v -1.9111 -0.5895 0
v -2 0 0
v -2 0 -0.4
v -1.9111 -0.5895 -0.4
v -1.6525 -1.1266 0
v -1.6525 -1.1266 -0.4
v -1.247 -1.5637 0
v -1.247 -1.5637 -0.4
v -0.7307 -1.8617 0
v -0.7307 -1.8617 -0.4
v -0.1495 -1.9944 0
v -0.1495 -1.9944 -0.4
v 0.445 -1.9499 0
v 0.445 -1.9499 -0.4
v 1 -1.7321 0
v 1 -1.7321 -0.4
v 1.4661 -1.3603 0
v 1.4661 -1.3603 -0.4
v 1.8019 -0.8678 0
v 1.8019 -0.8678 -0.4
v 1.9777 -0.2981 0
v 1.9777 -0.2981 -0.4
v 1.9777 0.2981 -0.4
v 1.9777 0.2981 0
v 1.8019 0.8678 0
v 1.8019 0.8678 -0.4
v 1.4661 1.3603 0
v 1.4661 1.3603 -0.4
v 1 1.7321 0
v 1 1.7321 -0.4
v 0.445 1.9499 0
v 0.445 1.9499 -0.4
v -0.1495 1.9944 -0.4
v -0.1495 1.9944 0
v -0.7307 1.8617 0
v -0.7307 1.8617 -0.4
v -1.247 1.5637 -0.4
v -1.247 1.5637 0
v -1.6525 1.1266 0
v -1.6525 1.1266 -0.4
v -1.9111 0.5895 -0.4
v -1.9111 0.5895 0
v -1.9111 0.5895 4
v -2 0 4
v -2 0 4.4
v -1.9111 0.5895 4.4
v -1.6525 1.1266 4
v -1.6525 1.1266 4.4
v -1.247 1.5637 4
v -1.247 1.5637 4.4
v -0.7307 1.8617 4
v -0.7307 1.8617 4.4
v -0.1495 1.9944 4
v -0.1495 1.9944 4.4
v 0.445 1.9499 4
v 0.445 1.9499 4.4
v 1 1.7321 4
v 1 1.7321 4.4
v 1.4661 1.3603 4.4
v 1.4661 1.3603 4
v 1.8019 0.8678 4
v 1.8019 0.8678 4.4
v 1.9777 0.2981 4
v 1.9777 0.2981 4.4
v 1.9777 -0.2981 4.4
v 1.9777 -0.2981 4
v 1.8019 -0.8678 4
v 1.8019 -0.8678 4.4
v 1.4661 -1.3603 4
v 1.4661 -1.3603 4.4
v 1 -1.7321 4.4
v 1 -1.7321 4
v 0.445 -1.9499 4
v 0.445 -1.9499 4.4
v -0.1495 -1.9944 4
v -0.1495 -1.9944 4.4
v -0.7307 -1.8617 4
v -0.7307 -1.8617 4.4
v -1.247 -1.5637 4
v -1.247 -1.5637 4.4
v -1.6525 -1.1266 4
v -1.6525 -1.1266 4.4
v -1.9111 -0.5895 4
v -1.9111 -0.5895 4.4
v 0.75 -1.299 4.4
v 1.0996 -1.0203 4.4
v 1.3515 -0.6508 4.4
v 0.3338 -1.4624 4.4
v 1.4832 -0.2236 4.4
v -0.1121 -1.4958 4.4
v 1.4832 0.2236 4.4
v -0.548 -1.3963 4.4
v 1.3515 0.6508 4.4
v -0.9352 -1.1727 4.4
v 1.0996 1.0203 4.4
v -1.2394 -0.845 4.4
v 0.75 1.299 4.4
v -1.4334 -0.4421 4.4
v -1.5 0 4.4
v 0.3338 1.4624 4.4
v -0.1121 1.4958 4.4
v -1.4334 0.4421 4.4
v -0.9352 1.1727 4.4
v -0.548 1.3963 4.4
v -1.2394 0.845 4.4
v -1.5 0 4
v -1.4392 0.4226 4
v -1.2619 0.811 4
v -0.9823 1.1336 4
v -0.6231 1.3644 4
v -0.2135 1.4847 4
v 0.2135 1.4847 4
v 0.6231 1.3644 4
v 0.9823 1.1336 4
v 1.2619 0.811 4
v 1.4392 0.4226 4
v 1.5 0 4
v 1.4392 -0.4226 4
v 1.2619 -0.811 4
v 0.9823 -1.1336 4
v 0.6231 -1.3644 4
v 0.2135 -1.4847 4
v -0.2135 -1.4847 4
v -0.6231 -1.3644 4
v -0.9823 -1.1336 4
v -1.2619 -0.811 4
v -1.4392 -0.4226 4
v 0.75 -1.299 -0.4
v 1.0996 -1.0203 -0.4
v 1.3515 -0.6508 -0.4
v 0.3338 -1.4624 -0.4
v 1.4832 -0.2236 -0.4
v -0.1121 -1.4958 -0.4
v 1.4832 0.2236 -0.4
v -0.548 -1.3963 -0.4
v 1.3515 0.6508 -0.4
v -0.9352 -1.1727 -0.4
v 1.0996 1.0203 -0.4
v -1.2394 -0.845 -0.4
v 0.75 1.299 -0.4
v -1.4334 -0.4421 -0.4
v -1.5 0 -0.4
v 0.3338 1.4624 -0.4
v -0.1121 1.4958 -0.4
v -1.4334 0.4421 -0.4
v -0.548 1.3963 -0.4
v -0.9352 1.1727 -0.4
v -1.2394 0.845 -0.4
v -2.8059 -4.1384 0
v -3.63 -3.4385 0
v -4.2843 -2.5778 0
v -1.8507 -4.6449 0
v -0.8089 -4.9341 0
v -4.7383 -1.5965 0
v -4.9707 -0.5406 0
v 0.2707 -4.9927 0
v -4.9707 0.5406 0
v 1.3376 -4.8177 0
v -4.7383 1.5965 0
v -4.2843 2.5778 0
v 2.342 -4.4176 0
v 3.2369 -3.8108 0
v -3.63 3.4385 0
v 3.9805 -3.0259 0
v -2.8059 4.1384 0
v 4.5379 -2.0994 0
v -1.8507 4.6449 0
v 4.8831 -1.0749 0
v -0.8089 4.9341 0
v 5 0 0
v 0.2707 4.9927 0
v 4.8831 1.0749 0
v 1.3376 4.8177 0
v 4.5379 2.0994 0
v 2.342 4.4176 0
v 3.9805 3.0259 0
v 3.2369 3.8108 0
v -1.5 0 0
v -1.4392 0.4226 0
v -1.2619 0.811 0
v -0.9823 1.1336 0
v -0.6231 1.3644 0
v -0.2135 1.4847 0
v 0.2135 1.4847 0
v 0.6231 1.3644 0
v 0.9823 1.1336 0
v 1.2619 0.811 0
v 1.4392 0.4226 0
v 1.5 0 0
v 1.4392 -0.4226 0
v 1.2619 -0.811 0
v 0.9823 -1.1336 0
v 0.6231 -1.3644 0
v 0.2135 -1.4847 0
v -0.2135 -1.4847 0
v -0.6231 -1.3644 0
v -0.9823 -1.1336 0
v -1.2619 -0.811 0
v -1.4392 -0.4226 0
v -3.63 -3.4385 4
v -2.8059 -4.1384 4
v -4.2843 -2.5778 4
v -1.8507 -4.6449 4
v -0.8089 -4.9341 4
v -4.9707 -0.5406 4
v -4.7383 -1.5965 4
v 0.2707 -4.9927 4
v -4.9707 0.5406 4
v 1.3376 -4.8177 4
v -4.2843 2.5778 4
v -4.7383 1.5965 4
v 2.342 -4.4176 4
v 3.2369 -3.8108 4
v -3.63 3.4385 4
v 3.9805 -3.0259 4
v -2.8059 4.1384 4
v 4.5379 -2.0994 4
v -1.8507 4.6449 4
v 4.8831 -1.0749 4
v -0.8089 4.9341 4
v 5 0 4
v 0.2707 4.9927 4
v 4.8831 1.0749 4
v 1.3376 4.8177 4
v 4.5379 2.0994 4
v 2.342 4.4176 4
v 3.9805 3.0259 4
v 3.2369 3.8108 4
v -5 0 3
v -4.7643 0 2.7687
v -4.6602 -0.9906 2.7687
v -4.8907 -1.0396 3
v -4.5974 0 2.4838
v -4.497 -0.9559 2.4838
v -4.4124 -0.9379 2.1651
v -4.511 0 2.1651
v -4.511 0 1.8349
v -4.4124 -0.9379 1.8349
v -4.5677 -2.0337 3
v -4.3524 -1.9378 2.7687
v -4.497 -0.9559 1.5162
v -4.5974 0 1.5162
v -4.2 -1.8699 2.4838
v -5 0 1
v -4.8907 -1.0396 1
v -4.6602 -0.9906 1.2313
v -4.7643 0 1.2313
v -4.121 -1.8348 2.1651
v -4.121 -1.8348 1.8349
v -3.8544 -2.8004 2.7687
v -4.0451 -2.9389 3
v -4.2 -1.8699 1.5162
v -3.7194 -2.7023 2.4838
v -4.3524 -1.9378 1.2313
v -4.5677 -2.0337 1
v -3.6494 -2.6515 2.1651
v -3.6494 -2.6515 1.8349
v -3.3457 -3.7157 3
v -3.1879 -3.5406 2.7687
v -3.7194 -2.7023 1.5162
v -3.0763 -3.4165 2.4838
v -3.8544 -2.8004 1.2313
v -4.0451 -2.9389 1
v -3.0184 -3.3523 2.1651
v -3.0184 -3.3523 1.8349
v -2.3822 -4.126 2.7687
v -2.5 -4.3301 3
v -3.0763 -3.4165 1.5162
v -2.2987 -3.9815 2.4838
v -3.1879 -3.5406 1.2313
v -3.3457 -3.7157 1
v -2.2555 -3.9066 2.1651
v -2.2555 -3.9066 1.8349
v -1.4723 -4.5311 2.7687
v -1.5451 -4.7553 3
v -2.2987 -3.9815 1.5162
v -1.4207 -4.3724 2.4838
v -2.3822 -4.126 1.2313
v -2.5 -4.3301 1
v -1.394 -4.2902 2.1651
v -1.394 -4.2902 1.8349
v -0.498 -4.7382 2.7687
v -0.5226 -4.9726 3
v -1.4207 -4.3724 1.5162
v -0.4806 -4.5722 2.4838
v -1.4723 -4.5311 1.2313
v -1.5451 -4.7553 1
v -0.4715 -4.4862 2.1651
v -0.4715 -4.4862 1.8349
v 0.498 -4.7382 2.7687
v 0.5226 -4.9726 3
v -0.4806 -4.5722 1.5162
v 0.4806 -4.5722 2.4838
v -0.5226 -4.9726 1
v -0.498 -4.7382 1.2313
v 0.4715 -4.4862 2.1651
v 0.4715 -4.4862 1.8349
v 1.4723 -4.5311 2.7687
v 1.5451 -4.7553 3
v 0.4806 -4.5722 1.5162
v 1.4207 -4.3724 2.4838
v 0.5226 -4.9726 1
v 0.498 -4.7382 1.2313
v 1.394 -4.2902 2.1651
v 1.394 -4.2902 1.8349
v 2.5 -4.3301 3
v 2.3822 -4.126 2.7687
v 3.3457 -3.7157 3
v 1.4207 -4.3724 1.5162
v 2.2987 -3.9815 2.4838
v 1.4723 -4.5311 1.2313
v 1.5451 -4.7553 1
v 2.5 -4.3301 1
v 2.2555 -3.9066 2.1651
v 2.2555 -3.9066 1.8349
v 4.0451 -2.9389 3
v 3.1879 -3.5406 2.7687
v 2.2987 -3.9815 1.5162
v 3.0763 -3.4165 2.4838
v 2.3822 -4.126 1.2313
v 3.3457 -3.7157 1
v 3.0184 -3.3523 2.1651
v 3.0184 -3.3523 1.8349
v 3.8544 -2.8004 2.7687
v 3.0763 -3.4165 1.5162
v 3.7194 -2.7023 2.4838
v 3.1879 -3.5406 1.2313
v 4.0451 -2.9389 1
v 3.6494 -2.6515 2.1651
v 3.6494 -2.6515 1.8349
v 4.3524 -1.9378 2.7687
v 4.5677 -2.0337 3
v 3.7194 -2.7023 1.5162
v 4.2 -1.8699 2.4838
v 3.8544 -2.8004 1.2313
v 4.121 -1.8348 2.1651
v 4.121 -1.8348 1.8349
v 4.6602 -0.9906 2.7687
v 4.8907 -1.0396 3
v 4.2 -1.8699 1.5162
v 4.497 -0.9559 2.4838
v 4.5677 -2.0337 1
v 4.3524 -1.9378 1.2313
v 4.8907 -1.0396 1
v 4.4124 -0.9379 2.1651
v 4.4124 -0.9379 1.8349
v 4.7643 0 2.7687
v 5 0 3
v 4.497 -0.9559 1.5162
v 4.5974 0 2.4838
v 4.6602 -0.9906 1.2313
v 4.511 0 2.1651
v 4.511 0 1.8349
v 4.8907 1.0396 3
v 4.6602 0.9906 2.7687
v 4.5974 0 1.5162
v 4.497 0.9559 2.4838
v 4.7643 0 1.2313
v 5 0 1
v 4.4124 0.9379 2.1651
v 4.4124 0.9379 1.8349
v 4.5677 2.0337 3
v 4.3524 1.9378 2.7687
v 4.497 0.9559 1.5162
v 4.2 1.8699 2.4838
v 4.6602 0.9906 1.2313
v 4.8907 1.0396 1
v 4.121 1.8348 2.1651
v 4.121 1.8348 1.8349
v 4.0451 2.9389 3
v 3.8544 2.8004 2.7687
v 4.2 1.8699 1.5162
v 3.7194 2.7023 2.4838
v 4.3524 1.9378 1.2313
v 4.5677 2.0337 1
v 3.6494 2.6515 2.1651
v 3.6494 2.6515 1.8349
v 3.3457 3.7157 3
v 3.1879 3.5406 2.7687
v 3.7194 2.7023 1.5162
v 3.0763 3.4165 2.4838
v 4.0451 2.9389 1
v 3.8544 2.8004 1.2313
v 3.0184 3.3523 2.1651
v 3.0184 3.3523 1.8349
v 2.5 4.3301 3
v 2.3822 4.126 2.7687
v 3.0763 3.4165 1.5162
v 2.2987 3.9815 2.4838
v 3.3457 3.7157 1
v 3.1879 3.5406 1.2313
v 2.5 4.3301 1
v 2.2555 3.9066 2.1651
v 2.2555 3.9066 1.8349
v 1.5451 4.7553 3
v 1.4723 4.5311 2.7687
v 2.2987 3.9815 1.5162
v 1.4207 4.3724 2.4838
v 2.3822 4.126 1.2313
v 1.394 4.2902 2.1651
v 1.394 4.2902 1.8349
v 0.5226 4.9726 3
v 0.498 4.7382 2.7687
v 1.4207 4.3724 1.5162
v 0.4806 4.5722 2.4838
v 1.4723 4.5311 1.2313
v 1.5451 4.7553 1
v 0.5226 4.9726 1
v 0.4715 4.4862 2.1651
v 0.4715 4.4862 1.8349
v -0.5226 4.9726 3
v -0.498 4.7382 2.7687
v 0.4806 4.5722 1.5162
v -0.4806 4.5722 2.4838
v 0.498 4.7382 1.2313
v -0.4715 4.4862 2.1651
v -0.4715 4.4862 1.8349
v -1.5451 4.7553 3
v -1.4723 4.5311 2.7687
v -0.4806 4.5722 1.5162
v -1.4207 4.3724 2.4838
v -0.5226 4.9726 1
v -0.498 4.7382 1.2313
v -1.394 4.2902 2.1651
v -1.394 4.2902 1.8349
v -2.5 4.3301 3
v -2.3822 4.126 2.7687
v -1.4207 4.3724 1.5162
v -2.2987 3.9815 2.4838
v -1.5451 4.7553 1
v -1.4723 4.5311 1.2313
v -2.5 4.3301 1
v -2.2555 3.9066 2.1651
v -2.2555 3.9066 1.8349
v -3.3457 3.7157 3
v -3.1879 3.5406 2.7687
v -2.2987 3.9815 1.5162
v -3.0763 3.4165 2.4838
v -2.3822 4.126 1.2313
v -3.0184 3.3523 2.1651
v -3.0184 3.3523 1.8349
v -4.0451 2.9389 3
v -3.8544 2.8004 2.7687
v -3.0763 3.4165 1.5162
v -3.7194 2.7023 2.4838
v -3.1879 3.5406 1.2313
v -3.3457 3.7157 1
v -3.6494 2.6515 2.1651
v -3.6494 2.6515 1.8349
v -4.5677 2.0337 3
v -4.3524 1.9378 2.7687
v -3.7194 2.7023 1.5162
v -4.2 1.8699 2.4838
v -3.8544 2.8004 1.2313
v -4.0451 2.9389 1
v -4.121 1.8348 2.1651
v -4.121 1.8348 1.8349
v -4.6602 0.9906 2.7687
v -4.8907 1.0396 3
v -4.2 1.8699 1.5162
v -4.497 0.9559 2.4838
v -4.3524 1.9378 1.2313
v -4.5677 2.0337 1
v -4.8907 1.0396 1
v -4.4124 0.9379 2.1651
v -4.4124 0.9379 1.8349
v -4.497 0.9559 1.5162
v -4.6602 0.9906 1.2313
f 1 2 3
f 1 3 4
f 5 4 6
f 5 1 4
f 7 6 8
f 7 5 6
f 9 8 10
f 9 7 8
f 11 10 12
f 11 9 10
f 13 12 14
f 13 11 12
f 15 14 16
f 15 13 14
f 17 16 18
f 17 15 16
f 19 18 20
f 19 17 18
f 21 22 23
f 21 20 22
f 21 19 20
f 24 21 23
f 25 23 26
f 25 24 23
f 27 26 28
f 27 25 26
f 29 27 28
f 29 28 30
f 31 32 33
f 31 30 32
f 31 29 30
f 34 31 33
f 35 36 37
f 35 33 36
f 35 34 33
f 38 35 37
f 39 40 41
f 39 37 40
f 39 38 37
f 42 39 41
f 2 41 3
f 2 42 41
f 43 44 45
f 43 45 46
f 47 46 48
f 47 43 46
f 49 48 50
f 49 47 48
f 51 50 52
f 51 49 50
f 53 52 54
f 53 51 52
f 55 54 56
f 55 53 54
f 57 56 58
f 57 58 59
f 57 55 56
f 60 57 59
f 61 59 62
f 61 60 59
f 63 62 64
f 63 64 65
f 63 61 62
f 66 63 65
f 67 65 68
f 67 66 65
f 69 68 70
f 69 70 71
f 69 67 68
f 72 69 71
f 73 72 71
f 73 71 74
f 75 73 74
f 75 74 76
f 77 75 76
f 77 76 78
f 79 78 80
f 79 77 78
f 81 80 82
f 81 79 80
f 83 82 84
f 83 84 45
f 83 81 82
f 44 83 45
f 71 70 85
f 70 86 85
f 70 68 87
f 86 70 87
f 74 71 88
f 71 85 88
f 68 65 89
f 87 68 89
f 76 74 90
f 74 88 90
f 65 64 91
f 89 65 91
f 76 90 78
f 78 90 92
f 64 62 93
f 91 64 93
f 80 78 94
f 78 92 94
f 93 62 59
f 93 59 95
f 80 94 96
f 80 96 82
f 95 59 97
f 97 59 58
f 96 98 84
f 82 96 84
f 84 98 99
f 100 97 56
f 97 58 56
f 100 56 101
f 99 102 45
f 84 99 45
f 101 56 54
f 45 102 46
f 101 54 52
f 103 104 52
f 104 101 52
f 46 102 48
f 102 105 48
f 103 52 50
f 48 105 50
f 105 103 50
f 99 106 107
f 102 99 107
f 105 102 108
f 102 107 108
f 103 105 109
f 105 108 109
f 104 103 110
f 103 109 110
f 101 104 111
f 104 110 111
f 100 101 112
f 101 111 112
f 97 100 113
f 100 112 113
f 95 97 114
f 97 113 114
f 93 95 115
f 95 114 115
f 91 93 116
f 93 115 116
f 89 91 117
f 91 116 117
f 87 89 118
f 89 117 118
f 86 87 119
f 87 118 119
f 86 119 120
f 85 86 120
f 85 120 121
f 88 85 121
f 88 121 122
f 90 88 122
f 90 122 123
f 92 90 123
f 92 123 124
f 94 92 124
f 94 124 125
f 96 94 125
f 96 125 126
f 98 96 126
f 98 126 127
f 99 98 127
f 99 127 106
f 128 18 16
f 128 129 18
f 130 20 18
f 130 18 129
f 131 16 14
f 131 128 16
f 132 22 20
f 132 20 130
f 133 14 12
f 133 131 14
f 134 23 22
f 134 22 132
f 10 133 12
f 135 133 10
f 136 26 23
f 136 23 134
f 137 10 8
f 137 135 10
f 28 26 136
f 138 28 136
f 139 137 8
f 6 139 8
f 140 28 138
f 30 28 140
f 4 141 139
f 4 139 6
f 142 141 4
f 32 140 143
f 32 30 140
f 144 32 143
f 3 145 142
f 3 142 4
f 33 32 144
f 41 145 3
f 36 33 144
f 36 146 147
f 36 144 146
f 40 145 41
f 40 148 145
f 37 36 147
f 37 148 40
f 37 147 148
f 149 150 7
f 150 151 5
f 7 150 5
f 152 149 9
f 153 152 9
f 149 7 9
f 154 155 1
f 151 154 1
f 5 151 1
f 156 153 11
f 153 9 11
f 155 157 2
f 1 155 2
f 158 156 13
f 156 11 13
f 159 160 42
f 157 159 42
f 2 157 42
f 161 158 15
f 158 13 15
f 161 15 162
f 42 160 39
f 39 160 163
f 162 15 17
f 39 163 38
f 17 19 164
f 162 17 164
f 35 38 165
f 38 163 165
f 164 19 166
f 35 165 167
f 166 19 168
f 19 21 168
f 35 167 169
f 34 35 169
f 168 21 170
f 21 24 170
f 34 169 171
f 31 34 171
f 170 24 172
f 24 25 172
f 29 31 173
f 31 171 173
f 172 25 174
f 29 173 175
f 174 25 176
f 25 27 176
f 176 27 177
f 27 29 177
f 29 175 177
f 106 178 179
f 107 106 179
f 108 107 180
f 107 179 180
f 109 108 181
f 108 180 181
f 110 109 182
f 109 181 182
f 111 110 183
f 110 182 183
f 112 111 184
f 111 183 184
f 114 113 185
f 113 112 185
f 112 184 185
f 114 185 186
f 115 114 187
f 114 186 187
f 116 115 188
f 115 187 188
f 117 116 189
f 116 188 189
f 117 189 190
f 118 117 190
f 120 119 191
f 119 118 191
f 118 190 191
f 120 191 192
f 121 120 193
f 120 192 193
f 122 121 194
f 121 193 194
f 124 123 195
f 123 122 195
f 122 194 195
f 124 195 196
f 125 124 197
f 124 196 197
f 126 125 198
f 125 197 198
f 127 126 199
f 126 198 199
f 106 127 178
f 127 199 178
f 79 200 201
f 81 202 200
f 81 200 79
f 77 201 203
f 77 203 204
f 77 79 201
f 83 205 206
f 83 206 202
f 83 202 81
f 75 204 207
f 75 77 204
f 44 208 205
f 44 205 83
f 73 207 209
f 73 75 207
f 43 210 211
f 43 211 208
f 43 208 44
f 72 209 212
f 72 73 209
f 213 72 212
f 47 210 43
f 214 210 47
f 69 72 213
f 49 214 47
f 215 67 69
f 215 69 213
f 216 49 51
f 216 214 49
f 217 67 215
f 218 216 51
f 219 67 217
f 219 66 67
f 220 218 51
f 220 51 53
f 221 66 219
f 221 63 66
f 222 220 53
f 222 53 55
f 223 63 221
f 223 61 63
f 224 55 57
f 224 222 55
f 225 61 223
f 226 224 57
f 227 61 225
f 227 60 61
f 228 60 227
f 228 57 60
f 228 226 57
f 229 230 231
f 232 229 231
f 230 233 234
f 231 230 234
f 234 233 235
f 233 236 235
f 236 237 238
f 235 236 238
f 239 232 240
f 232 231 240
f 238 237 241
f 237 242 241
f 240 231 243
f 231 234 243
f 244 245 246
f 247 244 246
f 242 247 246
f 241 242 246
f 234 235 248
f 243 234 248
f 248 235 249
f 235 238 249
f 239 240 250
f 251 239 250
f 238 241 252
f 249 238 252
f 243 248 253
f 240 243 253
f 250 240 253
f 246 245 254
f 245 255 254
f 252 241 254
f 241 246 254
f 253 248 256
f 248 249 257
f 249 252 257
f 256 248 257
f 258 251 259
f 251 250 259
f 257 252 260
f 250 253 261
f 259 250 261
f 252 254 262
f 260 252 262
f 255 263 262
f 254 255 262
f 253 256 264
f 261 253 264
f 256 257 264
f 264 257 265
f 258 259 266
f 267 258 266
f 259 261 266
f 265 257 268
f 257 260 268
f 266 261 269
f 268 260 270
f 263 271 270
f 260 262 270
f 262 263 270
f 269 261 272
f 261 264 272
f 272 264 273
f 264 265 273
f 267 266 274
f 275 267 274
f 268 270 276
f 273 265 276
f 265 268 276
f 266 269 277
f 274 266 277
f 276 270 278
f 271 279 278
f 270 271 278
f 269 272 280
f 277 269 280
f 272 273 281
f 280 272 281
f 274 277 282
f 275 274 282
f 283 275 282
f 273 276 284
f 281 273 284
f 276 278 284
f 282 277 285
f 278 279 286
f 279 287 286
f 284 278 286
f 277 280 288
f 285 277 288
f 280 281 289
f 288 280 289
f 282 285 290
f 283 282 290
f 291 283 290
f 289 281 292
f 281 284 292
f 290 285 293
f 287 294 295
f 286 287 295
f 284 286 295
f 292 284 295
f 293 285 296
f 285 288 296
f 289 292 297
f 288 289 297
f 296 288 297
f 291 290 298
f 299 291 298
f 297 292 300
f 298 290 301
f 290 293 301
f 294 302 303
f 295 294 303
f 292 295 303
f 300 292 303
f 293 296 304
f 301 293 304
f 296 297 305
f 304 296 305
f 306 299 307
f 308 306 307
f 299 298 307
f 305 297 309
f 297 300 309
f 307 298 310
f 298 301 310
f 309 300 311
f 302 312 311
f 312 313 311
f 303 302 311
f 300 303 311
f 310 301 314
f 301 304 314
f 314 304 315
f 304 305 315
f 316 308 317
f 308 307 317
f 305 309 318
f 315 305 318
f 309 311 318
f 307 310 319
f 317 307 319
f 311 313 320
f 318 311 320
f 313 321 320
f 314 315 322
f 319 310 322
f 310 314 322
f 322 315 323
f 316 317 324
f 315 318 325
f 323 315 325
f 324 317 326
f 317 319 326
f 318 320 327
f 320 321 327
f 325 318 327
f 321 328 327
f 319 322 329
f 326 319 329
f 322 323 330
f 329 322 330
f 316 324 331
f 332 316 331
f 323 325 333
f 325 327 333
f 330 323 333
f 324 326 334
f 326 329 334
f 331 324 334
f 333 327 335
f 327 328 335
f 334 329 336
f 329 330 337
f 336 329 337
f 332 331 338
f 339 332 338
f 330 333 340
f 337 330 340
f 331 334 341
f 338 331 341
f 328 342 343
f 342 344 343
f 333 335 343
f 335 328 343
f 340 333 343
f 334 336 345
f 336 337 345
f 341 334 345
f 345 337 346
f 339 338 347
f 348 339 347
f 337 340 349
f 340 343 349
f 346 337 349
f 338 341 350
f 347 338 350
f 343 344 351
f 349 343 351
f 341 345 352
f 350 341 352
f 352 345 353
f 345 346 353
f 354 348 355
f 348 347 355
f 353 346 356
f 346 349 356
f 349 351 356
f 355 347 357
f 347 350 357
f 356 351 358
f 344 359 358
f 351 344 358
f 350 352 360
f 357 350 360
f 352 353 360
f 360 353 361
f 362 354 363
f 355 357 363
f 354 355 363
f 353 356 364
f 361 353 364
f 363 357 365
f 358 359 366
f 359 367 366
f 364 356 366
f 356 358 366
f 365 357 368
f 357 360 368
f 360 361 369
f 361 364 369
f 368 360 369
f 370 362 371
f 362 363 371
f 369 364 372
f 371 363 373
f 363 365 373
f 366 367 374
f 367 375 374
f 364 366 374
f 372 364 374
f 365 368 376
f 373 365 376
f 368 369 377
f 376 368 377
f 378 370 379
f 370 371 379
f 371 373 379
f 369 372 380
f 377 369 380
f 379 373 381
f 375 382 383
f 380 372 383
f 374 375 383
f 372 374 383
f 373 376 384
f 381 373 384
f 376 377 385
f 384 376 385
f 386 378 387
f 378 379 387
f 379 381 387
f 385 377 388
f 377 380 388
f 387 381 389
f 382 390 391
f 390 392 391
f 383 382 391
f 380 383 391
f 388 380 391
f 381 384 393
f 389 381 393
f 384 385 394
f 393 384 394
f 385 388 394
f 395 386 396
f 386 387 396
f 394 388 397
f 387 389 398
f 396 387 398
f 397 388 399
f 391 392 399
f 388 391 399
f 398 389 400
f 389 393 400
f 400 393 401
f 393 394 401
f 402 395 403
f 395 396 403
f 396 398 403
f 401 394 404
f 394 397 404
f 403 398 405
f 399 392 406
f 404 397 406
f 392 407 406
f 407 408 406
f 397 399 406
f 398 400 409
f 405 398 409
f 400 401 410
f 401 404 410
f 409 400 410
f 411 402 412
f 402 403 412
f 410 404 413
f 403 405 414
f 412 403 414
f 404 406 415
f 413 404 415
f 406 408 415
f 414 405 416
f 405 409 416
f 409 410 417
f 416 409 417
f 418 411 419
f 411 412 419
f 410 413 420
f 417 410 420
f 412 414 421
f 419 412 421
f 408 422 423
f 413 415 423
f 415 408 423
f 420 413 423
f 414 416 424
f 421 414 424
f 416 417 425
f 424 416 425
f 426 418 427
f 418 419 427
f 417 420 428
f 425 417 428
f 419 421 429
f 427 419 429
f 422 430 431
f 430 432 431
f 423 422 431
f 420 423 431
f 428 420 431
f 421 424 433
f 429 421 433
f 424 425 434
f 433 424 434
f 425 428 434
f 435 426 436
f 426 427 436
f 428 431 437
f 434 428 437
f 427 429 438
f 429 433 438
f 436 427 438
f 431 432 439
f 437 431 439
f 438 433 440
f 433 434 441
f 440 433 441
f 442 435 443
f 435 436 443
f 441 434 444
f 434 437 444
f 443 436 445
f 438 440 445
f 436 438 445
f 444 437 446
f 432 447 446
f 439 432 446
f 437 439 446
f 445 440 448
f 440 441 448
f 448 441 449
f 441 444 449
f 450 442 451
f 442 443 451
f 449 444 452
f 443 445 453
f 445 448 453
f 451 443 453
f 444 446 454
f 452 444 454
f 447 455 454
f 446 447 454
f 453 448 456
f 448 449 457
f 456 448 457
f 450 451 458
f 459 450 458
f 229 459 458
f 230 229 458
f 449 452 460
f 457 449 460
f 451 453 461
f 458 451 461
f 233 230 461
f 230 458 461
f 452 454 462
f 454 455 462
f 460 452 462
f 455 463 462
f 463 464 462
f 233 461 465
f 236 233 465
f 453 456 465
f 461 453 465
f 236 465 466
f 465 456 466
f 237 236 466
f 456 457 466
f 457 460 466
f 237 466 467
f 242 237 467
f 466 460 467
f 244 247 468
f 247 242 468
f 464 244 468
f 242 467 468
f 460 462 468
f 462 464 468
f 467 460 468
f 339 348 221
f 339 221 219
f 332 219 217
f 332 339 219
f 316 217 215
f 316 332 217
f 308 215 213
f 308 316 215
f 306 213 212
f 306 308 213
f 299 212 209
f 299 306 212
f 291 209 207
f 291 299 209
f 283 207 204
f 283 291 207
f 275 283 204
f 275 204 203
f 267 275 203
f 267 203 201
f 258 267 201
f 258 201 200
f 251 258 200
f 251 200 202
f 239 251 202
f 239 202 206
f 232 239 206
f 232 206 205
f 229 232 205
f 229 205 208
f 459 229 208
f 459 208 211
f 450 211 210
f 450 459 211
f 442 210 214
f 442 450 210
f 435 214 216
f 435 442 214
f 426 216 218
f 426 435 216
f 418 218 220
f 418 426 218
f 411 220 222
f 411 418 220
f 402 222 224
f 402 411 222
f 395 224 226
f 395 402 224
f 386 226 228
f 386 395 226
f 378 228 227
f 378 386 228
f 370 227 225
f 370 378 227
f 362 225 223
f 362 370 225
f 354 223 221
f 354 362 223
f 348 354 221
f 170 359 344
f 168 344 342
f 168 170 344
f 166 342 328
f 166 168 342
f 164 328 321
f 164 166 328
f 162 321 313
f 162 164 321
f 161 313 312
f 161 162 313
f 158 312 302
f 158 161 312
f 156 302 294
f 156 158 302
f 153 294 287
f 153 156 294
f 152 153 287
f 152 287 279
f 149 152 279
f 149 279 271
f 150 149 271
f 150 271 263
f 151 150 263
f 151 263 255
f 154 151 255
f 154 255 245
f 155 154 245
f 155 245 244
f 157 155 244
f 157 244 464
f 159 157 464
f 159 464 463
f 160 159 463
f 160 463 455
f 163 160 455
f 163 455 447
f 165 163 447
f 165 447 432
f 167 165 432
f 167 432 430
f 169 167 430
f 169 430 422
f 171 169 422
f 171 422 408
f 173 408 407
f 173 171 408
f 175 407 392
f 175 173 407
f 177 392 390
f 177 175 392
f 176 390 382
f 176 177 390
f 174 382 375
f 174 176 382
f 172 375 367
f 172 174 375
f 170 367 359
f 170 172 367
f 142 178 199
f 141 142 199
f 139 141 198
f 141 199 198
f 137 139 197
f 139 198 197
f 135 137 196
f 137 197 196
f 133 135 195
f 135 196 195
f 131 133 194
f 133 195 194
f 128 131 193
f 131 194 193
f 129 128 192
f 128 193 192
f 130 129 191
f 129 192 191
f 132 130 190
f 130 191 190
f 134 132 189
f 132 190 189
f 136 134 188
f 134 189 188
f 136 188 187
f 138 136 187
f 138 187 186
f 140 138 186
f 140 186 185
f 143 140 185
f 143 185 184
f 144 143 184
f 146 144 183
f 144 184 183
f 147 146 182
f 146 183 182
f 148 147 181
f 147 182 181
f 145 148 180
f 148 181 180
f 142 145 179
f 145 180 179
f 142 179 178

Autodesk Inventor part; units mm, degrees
ref_plane "YZ Plane" through (0, 0, 0) normal (1, 0, 0) x (0, 1, 0)
ref_plane "XZ Plane" through (0, 0, 0) normal (0, 1, 0) x (-1, 0, 0)
ref_plane "XY Plane" through (0, 0, 0) normal (0, 0, 1) x (1, 0, 0)
sketch "Эскиз6" plane through (0, 0, 0) normal (0, 0, 1) x (1, 0, 0)
  circle A0 centre (0, 0) radius 1.5
  circle A1 centre (0, 0) radius 5
  dimension "d16" = 3
  dimension "d30" = 10
extrude "Выдавливание5" add sketch "Эскиз6" along normal blind 4
sketch "Эскиз7" plane through (0, 0, 0) normal (0, 1, 0) x (-1, 0, 0)
  line L0 (0, 0) -> (0, 4)
  line L1 (5, 4) -> (-5, 4) projected
  line L2 (5, 0) -> (5, 4) projected
  line L3 (5, 2) -> (4.5, 2)
  line L4 (5, 2) -> (5, 1)
  line L5 (5, 0) -> (5, 4) projected
  line L6 (5, 1) -> (5, 3)
  line L7 (5, 0) -> (5, 4) projected
  arc A0 (5, 3) -> (5, 1) centre (5.75, 2) ccw
  point P0 (6.5, 6)
  point P1 (6.5, 0)
  point P2 (5, 3)
  point P3 (5, 1)
  dimension "d31" = 0.5
  dimension "d32" = 1
  dimension "d33" = 2
revolve "Вращение2" cut sketch "Эскиз7" angle 360 about axis through (0, 0, 0) along (0, 0, 1)
fillet "Сопряжение3" [suppressed]
sketch "Эскиз8" plane through (0, 0, 0) normal (0, 0, -1) x (-1, 0, 0)
  circle A0 centre (0, 0) radius 2
  circle A1 centre (0, 0) radius 1.5
  dimension "d25" = 4
extrude "Выдавливание6" add sketch "Эскиз8" along normal blind 0.4 and the other way blind 4.4
properties part number "rolik_2" material "Серебро"
